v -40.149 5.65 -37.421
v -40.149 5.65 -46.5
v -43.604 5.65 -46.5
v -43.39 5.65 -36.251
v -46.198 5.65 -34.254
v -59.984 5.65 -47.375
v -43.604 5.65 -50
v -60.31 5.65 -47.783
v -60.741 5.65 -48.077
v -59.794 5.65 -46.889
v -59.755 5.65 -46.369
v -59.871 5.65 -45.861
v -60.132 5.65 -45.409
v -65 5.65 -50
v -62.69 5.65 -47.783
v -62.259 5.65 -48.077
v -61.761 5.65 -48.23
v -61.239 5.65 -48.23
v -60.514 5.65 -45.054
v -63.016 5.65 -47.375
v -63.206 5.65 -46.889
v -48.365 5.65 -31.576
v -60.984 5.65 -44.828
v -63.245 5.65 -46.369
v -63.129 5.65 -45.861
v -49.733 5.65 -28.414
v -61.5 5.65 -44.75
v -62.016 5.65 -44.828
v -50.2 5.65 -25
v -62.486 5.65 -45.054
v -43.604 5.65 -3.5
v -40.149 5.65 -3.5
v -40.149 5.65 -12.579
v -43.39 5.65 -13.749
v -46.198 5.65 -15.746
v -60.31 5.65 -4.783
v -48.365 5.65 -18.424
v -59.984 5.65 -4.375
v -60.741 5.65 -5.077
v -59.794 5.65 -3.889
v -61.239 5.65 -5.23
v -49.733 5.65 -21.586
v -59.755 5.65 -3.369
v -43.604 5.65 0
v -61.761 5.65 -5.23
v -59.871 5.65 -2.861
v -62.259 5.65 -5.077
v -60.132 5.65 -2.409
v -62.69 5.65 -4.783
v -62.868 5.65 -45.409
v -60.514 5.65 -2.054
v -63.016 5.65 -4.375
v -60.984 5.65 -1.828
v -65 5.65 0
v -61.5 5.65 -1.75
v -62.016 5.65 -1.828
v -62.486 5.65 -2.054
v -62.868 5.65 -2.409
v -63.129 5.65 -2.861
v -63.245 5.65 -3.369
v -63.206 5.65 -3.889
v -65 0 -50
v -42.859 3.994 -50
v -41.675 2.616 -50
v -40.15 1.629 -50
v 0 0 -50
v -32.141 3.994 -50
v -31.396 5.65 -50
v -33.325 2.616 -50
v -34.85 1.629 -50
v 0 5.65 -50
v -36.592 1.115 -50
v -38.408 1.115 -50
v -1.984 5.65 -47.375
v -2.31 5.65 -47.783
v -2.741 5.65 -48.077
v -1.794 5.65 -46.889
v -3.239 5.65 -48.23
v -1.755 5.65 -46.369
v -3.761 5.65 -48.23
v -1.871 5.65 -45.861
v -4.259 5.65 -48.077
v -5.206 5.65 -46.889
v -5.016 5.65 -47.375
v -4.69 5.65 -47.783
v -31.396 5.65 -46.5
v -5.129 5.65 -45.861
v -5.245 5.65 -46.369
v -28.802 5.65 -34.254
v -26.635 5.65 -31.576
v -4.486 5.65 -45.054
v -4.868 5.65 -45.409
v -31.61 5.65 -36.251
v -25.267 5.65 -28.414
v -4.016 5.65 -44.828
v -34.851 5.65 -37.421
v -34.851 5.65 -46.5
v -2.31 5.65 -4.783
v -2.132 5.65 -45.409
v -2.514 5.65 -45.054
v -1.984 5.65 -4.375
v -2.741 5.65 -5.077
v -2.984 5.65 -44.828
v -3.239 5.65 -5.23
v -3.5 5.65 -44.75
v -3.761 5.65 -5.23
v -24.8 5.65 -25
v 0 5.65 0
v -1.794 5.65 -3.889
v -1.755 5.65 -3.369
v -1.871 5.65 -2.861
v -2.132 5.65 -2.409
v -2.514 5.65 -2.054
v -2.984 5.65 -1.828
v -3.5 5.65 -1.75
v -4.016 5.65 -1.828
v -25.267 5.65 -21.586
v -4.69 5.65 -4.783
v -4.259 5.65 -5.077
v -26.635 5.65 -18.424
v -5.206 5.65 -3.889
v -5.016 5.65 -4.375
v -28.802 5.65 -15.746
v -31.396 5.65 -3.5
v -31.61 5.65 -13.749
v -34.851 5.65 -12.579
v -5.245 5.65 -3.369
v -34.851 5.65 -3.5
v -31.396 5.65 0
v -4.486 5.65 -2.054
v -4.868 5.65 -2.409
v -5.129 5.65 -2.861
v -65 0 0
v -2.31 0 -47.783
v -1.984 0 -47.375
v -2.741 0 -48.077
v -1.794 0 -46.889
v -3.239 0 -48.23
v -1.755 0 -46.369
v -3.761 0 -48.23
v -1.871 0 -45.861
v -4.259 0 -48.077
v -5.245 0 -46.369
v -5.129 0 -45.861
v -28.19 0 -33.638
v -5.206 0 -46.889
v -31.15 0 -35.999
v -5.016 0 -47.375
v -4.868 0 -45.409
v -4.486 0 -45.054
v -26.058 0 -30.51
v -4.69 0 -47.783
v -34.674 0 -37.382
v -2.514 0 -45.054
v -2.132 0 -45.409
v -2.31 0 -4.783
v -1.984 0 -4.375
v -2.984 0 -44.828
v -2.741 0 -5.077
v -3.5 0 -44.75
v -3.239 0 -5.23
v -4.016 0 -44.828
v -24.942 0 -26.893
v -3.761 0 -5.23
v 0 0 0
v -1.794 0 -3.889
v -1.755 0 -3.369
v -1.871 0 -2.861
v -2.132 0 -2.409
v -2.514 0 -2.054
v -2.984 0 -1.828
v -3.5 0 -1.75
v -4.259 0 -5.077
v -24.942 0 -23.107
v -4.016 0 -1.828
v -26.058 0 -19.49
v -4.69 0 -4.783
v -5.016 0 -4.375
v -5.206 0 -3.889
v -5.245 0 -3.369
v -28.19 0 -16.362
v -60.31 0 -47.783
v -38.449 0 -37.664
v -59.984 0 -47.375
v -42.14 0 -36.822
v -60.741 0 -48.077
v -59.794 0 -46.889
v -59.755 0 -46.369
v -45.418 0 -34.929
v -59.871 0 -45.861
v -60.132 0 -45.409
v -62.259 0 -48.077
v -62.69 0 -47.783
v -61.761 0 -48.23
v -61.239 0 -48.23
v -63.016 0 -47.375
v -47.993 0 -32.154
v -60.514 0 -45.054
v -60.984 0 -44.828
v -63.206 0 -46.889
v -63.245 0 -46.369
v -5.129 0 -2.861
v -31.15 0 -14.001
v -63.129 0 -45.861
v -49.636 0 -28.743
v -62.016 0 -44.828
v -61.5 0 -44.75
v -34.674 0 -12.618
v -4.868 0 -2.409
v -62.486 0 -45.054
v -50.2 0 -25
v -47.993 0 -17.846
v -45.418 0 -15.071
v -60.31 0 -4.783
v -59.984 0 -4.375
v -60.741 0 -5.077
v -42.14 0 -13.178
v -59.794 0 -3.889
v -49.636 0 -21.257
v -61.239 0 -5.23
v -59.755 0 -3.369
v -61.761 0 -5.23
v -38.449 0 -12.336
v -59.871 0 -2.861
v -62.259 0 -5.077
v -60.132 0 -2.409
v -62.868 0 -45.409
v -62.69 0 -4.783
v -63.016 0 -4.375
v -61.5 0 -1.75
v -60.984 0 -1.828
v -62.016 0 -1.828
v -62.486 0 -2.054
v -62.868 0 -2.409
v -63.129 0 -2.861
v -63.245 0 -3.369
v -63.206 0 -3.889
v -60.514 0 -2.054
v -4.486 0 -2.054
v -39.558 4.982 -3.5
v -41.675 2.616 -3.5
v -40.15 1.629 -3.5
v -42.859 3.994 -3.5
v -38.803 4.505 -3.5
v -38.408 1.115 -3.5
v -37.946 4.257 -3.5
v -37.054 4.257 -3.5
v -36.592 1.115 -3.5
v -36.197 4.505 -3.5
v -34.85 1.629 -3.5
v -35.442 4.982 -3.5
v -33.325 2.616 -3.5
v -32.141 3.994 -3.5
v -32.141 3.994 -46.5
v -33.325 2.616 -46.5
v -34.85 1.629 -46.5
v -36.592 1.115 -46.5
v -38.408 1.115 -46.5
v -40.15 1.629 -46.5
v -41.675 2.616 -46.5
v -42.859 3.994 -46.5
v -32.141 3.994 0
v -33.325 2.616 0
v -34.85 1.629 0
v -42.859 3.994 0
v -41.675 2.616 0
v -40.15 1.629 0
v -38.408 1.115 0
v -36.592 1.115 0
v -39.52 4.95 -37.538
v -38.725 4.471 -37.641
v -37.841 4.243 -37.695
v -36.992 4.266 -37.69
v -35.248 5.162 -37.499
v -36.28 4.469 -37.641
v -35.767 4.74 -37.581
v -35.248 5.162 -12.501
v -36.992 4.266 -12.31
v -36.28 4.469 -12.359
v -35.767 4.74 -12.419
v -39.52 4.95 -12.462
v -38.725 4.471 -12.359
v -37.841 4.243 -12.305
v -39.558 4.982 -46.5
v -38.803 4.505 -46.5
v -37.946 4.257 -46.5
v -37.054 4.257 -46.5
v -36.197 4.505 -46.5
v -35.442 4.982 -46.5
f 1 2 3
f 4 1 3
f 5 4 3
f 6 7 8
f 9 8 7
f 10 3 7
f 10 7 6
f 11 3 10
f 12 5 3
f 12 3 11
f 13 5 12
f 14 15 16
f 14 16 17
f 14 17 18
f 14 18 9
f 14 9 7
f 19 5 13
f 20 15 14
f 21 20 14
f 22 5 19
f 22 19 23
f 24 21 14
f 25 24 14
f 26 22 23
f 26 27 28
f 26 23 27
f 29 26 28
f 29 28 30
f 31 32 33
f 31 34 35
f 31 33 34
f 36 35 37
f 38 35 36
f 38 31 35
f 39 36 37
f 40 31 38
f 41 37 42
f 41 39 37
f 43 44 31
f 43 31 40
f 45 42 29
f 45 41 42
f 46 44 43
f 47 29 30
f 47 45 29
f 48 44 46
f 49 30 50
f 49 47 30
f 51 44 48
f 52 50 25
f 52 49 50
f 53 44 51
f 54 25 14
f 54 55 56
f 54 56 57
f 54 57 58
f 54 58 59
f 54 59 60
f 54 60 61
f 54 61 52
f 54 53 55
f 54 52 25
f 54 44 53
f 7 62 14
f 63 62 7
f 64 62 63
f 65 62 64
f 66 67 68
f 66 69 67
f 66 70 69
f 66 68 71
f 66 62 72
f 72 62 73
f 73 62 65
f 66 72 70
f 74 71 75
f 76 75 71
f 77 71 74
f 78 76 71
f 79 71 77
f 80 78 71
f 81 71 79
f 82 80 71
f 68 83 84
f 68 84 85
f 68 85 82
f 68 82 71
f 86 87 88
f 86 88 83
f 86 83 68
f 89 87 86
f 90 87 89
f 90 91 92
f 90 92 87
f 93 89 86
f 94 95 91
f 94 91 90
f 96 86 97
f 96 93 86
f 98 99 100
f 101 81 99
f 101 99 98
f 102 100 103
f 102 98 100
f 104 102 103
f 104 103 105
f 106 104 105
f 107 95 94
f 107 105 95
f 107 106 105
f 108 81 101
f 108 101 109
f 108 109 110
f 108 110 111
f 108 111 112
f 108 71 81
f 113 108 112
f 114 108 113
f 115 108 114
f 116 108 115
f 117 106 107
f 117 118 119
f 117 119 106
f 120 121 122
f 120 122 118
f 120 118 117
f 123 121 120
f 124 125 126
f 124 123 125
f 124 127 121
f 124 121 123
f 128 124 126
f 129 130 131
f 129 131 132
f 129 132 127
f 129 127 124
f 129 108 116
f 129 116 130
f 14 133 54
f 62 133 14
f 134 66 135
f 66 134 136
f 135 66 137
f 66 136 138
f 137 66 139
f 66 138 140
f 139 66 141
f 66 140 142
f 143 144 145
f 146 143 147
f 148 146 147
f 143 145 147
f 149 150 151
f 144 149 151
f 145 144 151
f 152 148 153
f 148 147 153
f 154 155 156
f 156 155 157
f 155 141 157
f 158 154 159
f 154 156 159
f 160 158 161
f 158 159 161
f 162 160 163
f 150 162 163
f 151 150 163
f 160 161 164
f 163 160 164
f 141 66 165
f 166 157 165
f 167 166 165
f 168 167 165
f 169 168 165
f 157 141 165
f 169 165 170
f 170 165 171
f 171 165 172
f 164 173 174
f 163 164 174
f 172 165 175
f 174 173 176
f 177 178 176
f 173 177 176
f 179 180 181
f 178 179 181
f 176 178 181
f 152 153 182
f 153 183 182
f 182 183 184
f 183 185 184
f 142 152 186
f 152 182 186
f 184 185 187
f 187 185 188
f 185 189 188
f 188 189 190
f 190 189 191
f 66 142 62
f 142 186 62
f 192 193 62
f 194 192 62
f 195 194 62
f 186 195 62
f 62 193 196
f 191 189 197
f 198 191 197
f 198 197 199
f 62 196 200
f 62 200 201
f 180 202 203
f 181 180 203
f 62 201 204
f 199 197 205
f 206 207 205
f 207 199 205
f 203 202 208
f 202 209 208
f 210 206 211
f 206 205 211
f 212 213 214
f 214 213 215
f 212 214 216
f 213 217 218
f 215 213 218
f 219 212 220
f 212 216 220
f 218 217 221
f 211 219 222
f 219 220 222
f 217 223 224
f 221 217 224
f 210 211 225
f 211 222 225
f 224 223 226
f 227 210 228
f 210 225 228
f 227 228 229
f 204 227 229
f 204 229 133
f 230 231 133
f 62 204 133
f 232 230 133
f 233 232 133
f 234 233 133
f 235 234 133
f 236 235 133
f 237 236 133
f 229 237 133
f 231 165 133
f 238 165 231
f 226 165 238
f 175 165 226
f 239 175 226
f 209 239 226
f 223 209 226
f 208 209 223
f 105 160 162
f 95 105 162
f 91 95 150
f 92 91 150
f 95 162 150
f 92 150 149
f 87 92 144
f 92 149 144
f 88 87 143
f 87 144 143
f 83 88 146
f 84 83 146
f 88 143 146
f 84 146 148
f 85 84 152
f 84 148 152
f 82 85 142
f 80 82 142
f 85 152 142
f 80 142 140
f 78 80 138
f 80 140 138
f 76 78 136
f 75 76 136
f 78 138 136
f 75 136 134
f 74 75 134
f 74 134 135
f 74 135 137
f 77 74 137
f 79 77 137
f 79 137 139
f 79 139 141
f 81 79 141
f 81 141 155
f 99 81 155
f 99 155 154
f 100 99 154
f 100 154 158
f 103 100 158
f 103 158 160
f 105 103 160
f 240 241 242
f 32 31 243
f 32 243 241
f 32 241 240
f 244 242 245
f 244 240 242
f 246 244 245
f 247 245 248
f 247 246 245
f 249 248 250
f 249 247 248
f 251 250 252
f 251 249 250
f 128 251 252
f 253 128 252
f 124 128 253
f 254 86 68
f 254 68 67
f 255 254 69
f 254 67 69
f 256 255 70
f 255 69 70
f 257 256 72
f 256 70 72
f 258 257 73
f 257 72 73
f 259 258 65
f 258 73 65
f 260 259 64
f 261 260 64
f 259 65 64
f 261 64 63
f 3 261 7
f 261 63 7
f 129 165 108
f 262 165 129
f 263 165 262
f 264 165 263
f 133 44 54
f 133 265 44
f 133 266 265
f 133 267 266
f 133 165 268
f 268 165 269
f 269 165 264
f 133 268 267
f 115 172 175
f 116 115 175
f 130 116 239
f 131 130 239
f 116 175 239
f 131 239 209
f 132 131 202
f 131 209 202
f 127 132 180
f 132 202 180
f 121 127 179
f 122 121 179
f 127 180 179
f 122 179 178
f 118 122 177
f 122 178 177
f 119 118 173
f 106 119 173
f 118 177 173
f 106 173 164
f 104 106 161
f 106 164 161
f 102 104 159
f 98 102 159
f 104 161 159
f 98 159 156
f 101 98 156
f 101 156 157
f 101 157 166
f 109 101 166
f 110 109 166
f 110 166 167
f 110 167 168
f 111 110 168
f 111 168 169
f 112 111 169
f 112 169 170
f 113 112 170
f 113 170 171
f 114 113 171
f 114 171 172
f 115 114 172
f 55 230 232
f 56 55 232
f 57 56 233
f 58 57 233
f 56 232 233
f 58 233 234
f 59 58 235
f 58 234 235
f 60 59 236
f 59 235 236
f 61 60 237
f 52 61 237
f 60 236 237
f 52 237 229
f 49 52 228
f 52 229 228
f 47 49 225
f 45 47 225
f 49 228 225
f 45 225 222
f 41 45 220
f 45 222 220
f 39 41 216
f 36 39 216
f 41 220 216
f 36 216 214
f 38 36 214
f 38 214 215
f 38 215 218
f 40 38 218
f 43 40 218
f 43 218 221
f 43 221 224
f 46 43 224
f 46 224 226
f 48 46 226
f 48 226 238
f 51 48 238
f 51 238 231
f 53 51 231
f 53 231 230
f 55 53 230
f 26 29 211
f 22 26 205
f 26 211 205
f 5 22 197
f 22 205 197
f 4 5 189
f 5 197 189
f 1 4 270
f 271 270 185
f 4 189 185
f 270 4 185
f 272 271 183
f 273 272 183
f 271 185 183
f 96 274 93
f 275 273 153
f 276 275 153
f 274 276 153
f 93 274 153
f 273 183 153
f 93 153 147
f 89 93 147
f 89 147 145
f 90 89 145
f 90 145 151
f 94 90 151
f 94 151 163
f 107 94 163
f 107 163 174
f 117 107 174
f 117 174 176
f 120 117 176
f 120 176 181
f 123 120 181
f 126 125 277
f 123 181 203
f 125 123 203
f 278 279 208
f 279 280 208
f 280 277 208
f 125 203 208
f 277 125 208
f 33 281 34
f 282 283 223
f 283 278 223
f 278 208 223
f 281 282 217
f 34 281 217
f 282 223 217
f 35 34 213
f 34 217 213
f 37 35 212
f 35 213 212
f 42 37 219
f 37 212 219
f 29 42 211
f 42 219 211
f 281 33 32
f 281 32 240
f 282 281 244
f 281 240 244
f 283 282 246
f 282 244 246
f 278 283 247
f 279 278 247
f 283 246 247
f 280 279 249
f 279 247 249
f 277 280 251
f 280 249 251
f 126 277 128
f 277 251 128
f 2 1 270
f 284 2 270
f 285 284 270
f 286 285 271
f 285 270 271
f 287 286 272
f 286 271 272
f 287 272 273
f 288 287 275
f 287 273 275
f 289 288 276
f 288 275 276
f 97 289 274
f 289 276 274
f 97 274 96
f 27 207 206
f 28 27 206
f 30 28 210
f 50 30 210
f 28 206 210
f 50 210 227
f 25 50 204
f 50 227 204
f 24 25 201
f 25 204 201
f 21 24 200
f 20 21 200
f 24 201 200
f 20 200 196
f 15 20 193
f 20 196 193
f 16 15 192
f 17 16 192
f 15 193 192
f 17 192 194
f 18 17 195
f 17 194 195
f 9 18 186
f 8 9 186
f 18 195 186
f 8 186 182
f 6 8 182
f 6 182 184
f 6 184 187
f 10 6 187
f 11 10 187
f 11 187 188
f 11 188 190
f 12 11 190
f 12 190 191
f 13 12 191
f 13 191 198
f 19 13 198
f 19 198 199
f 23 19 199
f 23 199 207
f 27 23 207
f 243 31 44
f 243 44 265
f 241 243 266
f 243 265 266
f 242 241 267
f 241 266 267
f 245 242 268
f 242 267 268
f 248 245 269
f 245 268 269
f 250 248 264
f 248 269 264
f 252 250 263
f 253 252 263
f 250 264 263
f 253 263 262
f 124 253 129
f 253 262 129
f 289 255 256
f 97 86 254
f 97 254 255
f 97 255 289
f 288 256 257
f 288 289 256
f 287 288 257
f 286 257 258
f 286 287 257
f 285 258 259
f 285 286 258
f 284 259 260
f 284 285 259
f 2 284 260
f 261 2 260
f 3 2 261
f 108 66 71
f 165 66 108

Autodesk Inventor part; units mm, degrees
ref_plane "YZ Plane" through (0, 0, 0) normal (1, 0, 0) x (0, 1, 0)
ref_plane "XZ Plane" through (0, 0, 0) normal (0, 1, 0) x (-1, 0, 0)
ref_plane "XY Plane" through (0, 0, 0) normal (0, 0, 1) x (1, 0, 0)
sketch "Sketch1" plane through (0, 0, 0) normal (0, 1, 0) x (-1, 0, 0)
  line L0 (0, 0) -> (65, 0)
  line L1 (65, 0) -> (65, -50)
  line L2 (65, -50) -> (0, -50)
  line L3 (0, -50) -> (0, 0)
  circle A0 centre (37.5, -25) radius 12.7
  dimension "d0" = 65
  dimension "d1" = 50
  dimension "d2" = 25.4
  dimension "d3" = 27.5
extrude "Extrusion1" add sketch "Sketch1" along normal blind 5.65
thread "Thread1" size "1-32 UN" class "2B" standard "ANSI Unified Screw Threads" full length
sketch "Sketch2" plane through (0, 5.65, 0) normal (0, 1, 0) x (1, 0, 0)
  line L0 (-65, 0) -> (0, 0) projected
  line L1 (-65, 50) -> (-65, 0) projected
  line L2 (0, 0) -> (0, 50) projected
  line L3 (0, 50) -> (-65, 50) projected
  point P0 (-61.5, 3.5)
  point P1 (-3.5, 3.5)
  point P2 (-3.5, 46.5)
  point P3 (-61.5, 46.5)
  dimension "d15" = 3.5
  dimension "d16" = 3.5
  dimension "d17" = 3.5
  dimension "d18" = 3.5
  dimension "d19" = 3.5
  dimension "d20" = 3.5
  dimension "d21" = 3.5
  dimension "d22" = 3.5
hole "Hole1" at (-61.5, 5.65, -3.5) at (-3.5, 5.65, -3.5) at (-3.5, 5.65, -46.5) at (-61.5, 5.65, -46.5) direction (0, -1, 0) diameter 3.5 end through all
sketch "Sketch3" plane through (-65, 0, 0) normal (0, 0, 1) x (1, 0, 0)
  line L0 (14.8, 5.65) -> (40.2, 5.65) projected
  line L1 (27.5, 5.65) -> (27.5, 7.4)
  circle A0 centre (27.5, 7.4) radius 3.175
  circle A1 centre (27.5, 7.4) radius 6.35
  point P0 (65, 0)
  point P1 (21.3959, 5.65)
  point P2 (33.6041, 5.65)
  point P3 (30.1492, 5.65)
  point P4 (24.8508, 5.65)
  dimension "d23" = 1.75
  dimension "d24" = 6.35
  dimension "d25" = 12.7
extrude "Extrusion2" cut sketch "Sketch3" against normal blind 60 contours A0 L0 | L0 A0
extrude "Extrusion3" cut sketch "Sketch3" against normal blind 3.5 contours L0 A0 A1 picked at (22.7391, 5.1926)
sketch "Sketch4" plane through (0, 0, -50) normal (0, 0, -1) x (-1, 0, 0)
  arc A0 (34.8508, 5.65) -> (40.1492, 5.65) centre (37.5, 7.4) ccw projected
  circle A1 centre (37.5, 7.4) radius 6.35
  point P0 (0, 0)
  dimension "d30" = 12.7
extrude "Extrusion4" cut sketch "Sketch4" against normal blind 3.5
thread "Thread2" size "1/2-32 UN" class "2B" standard "ANSI Unified Screw Threads" full length
equation "\"d30\" = d25"
properties part number "CuvetteHolderFace" material "Aluminum 6061"
